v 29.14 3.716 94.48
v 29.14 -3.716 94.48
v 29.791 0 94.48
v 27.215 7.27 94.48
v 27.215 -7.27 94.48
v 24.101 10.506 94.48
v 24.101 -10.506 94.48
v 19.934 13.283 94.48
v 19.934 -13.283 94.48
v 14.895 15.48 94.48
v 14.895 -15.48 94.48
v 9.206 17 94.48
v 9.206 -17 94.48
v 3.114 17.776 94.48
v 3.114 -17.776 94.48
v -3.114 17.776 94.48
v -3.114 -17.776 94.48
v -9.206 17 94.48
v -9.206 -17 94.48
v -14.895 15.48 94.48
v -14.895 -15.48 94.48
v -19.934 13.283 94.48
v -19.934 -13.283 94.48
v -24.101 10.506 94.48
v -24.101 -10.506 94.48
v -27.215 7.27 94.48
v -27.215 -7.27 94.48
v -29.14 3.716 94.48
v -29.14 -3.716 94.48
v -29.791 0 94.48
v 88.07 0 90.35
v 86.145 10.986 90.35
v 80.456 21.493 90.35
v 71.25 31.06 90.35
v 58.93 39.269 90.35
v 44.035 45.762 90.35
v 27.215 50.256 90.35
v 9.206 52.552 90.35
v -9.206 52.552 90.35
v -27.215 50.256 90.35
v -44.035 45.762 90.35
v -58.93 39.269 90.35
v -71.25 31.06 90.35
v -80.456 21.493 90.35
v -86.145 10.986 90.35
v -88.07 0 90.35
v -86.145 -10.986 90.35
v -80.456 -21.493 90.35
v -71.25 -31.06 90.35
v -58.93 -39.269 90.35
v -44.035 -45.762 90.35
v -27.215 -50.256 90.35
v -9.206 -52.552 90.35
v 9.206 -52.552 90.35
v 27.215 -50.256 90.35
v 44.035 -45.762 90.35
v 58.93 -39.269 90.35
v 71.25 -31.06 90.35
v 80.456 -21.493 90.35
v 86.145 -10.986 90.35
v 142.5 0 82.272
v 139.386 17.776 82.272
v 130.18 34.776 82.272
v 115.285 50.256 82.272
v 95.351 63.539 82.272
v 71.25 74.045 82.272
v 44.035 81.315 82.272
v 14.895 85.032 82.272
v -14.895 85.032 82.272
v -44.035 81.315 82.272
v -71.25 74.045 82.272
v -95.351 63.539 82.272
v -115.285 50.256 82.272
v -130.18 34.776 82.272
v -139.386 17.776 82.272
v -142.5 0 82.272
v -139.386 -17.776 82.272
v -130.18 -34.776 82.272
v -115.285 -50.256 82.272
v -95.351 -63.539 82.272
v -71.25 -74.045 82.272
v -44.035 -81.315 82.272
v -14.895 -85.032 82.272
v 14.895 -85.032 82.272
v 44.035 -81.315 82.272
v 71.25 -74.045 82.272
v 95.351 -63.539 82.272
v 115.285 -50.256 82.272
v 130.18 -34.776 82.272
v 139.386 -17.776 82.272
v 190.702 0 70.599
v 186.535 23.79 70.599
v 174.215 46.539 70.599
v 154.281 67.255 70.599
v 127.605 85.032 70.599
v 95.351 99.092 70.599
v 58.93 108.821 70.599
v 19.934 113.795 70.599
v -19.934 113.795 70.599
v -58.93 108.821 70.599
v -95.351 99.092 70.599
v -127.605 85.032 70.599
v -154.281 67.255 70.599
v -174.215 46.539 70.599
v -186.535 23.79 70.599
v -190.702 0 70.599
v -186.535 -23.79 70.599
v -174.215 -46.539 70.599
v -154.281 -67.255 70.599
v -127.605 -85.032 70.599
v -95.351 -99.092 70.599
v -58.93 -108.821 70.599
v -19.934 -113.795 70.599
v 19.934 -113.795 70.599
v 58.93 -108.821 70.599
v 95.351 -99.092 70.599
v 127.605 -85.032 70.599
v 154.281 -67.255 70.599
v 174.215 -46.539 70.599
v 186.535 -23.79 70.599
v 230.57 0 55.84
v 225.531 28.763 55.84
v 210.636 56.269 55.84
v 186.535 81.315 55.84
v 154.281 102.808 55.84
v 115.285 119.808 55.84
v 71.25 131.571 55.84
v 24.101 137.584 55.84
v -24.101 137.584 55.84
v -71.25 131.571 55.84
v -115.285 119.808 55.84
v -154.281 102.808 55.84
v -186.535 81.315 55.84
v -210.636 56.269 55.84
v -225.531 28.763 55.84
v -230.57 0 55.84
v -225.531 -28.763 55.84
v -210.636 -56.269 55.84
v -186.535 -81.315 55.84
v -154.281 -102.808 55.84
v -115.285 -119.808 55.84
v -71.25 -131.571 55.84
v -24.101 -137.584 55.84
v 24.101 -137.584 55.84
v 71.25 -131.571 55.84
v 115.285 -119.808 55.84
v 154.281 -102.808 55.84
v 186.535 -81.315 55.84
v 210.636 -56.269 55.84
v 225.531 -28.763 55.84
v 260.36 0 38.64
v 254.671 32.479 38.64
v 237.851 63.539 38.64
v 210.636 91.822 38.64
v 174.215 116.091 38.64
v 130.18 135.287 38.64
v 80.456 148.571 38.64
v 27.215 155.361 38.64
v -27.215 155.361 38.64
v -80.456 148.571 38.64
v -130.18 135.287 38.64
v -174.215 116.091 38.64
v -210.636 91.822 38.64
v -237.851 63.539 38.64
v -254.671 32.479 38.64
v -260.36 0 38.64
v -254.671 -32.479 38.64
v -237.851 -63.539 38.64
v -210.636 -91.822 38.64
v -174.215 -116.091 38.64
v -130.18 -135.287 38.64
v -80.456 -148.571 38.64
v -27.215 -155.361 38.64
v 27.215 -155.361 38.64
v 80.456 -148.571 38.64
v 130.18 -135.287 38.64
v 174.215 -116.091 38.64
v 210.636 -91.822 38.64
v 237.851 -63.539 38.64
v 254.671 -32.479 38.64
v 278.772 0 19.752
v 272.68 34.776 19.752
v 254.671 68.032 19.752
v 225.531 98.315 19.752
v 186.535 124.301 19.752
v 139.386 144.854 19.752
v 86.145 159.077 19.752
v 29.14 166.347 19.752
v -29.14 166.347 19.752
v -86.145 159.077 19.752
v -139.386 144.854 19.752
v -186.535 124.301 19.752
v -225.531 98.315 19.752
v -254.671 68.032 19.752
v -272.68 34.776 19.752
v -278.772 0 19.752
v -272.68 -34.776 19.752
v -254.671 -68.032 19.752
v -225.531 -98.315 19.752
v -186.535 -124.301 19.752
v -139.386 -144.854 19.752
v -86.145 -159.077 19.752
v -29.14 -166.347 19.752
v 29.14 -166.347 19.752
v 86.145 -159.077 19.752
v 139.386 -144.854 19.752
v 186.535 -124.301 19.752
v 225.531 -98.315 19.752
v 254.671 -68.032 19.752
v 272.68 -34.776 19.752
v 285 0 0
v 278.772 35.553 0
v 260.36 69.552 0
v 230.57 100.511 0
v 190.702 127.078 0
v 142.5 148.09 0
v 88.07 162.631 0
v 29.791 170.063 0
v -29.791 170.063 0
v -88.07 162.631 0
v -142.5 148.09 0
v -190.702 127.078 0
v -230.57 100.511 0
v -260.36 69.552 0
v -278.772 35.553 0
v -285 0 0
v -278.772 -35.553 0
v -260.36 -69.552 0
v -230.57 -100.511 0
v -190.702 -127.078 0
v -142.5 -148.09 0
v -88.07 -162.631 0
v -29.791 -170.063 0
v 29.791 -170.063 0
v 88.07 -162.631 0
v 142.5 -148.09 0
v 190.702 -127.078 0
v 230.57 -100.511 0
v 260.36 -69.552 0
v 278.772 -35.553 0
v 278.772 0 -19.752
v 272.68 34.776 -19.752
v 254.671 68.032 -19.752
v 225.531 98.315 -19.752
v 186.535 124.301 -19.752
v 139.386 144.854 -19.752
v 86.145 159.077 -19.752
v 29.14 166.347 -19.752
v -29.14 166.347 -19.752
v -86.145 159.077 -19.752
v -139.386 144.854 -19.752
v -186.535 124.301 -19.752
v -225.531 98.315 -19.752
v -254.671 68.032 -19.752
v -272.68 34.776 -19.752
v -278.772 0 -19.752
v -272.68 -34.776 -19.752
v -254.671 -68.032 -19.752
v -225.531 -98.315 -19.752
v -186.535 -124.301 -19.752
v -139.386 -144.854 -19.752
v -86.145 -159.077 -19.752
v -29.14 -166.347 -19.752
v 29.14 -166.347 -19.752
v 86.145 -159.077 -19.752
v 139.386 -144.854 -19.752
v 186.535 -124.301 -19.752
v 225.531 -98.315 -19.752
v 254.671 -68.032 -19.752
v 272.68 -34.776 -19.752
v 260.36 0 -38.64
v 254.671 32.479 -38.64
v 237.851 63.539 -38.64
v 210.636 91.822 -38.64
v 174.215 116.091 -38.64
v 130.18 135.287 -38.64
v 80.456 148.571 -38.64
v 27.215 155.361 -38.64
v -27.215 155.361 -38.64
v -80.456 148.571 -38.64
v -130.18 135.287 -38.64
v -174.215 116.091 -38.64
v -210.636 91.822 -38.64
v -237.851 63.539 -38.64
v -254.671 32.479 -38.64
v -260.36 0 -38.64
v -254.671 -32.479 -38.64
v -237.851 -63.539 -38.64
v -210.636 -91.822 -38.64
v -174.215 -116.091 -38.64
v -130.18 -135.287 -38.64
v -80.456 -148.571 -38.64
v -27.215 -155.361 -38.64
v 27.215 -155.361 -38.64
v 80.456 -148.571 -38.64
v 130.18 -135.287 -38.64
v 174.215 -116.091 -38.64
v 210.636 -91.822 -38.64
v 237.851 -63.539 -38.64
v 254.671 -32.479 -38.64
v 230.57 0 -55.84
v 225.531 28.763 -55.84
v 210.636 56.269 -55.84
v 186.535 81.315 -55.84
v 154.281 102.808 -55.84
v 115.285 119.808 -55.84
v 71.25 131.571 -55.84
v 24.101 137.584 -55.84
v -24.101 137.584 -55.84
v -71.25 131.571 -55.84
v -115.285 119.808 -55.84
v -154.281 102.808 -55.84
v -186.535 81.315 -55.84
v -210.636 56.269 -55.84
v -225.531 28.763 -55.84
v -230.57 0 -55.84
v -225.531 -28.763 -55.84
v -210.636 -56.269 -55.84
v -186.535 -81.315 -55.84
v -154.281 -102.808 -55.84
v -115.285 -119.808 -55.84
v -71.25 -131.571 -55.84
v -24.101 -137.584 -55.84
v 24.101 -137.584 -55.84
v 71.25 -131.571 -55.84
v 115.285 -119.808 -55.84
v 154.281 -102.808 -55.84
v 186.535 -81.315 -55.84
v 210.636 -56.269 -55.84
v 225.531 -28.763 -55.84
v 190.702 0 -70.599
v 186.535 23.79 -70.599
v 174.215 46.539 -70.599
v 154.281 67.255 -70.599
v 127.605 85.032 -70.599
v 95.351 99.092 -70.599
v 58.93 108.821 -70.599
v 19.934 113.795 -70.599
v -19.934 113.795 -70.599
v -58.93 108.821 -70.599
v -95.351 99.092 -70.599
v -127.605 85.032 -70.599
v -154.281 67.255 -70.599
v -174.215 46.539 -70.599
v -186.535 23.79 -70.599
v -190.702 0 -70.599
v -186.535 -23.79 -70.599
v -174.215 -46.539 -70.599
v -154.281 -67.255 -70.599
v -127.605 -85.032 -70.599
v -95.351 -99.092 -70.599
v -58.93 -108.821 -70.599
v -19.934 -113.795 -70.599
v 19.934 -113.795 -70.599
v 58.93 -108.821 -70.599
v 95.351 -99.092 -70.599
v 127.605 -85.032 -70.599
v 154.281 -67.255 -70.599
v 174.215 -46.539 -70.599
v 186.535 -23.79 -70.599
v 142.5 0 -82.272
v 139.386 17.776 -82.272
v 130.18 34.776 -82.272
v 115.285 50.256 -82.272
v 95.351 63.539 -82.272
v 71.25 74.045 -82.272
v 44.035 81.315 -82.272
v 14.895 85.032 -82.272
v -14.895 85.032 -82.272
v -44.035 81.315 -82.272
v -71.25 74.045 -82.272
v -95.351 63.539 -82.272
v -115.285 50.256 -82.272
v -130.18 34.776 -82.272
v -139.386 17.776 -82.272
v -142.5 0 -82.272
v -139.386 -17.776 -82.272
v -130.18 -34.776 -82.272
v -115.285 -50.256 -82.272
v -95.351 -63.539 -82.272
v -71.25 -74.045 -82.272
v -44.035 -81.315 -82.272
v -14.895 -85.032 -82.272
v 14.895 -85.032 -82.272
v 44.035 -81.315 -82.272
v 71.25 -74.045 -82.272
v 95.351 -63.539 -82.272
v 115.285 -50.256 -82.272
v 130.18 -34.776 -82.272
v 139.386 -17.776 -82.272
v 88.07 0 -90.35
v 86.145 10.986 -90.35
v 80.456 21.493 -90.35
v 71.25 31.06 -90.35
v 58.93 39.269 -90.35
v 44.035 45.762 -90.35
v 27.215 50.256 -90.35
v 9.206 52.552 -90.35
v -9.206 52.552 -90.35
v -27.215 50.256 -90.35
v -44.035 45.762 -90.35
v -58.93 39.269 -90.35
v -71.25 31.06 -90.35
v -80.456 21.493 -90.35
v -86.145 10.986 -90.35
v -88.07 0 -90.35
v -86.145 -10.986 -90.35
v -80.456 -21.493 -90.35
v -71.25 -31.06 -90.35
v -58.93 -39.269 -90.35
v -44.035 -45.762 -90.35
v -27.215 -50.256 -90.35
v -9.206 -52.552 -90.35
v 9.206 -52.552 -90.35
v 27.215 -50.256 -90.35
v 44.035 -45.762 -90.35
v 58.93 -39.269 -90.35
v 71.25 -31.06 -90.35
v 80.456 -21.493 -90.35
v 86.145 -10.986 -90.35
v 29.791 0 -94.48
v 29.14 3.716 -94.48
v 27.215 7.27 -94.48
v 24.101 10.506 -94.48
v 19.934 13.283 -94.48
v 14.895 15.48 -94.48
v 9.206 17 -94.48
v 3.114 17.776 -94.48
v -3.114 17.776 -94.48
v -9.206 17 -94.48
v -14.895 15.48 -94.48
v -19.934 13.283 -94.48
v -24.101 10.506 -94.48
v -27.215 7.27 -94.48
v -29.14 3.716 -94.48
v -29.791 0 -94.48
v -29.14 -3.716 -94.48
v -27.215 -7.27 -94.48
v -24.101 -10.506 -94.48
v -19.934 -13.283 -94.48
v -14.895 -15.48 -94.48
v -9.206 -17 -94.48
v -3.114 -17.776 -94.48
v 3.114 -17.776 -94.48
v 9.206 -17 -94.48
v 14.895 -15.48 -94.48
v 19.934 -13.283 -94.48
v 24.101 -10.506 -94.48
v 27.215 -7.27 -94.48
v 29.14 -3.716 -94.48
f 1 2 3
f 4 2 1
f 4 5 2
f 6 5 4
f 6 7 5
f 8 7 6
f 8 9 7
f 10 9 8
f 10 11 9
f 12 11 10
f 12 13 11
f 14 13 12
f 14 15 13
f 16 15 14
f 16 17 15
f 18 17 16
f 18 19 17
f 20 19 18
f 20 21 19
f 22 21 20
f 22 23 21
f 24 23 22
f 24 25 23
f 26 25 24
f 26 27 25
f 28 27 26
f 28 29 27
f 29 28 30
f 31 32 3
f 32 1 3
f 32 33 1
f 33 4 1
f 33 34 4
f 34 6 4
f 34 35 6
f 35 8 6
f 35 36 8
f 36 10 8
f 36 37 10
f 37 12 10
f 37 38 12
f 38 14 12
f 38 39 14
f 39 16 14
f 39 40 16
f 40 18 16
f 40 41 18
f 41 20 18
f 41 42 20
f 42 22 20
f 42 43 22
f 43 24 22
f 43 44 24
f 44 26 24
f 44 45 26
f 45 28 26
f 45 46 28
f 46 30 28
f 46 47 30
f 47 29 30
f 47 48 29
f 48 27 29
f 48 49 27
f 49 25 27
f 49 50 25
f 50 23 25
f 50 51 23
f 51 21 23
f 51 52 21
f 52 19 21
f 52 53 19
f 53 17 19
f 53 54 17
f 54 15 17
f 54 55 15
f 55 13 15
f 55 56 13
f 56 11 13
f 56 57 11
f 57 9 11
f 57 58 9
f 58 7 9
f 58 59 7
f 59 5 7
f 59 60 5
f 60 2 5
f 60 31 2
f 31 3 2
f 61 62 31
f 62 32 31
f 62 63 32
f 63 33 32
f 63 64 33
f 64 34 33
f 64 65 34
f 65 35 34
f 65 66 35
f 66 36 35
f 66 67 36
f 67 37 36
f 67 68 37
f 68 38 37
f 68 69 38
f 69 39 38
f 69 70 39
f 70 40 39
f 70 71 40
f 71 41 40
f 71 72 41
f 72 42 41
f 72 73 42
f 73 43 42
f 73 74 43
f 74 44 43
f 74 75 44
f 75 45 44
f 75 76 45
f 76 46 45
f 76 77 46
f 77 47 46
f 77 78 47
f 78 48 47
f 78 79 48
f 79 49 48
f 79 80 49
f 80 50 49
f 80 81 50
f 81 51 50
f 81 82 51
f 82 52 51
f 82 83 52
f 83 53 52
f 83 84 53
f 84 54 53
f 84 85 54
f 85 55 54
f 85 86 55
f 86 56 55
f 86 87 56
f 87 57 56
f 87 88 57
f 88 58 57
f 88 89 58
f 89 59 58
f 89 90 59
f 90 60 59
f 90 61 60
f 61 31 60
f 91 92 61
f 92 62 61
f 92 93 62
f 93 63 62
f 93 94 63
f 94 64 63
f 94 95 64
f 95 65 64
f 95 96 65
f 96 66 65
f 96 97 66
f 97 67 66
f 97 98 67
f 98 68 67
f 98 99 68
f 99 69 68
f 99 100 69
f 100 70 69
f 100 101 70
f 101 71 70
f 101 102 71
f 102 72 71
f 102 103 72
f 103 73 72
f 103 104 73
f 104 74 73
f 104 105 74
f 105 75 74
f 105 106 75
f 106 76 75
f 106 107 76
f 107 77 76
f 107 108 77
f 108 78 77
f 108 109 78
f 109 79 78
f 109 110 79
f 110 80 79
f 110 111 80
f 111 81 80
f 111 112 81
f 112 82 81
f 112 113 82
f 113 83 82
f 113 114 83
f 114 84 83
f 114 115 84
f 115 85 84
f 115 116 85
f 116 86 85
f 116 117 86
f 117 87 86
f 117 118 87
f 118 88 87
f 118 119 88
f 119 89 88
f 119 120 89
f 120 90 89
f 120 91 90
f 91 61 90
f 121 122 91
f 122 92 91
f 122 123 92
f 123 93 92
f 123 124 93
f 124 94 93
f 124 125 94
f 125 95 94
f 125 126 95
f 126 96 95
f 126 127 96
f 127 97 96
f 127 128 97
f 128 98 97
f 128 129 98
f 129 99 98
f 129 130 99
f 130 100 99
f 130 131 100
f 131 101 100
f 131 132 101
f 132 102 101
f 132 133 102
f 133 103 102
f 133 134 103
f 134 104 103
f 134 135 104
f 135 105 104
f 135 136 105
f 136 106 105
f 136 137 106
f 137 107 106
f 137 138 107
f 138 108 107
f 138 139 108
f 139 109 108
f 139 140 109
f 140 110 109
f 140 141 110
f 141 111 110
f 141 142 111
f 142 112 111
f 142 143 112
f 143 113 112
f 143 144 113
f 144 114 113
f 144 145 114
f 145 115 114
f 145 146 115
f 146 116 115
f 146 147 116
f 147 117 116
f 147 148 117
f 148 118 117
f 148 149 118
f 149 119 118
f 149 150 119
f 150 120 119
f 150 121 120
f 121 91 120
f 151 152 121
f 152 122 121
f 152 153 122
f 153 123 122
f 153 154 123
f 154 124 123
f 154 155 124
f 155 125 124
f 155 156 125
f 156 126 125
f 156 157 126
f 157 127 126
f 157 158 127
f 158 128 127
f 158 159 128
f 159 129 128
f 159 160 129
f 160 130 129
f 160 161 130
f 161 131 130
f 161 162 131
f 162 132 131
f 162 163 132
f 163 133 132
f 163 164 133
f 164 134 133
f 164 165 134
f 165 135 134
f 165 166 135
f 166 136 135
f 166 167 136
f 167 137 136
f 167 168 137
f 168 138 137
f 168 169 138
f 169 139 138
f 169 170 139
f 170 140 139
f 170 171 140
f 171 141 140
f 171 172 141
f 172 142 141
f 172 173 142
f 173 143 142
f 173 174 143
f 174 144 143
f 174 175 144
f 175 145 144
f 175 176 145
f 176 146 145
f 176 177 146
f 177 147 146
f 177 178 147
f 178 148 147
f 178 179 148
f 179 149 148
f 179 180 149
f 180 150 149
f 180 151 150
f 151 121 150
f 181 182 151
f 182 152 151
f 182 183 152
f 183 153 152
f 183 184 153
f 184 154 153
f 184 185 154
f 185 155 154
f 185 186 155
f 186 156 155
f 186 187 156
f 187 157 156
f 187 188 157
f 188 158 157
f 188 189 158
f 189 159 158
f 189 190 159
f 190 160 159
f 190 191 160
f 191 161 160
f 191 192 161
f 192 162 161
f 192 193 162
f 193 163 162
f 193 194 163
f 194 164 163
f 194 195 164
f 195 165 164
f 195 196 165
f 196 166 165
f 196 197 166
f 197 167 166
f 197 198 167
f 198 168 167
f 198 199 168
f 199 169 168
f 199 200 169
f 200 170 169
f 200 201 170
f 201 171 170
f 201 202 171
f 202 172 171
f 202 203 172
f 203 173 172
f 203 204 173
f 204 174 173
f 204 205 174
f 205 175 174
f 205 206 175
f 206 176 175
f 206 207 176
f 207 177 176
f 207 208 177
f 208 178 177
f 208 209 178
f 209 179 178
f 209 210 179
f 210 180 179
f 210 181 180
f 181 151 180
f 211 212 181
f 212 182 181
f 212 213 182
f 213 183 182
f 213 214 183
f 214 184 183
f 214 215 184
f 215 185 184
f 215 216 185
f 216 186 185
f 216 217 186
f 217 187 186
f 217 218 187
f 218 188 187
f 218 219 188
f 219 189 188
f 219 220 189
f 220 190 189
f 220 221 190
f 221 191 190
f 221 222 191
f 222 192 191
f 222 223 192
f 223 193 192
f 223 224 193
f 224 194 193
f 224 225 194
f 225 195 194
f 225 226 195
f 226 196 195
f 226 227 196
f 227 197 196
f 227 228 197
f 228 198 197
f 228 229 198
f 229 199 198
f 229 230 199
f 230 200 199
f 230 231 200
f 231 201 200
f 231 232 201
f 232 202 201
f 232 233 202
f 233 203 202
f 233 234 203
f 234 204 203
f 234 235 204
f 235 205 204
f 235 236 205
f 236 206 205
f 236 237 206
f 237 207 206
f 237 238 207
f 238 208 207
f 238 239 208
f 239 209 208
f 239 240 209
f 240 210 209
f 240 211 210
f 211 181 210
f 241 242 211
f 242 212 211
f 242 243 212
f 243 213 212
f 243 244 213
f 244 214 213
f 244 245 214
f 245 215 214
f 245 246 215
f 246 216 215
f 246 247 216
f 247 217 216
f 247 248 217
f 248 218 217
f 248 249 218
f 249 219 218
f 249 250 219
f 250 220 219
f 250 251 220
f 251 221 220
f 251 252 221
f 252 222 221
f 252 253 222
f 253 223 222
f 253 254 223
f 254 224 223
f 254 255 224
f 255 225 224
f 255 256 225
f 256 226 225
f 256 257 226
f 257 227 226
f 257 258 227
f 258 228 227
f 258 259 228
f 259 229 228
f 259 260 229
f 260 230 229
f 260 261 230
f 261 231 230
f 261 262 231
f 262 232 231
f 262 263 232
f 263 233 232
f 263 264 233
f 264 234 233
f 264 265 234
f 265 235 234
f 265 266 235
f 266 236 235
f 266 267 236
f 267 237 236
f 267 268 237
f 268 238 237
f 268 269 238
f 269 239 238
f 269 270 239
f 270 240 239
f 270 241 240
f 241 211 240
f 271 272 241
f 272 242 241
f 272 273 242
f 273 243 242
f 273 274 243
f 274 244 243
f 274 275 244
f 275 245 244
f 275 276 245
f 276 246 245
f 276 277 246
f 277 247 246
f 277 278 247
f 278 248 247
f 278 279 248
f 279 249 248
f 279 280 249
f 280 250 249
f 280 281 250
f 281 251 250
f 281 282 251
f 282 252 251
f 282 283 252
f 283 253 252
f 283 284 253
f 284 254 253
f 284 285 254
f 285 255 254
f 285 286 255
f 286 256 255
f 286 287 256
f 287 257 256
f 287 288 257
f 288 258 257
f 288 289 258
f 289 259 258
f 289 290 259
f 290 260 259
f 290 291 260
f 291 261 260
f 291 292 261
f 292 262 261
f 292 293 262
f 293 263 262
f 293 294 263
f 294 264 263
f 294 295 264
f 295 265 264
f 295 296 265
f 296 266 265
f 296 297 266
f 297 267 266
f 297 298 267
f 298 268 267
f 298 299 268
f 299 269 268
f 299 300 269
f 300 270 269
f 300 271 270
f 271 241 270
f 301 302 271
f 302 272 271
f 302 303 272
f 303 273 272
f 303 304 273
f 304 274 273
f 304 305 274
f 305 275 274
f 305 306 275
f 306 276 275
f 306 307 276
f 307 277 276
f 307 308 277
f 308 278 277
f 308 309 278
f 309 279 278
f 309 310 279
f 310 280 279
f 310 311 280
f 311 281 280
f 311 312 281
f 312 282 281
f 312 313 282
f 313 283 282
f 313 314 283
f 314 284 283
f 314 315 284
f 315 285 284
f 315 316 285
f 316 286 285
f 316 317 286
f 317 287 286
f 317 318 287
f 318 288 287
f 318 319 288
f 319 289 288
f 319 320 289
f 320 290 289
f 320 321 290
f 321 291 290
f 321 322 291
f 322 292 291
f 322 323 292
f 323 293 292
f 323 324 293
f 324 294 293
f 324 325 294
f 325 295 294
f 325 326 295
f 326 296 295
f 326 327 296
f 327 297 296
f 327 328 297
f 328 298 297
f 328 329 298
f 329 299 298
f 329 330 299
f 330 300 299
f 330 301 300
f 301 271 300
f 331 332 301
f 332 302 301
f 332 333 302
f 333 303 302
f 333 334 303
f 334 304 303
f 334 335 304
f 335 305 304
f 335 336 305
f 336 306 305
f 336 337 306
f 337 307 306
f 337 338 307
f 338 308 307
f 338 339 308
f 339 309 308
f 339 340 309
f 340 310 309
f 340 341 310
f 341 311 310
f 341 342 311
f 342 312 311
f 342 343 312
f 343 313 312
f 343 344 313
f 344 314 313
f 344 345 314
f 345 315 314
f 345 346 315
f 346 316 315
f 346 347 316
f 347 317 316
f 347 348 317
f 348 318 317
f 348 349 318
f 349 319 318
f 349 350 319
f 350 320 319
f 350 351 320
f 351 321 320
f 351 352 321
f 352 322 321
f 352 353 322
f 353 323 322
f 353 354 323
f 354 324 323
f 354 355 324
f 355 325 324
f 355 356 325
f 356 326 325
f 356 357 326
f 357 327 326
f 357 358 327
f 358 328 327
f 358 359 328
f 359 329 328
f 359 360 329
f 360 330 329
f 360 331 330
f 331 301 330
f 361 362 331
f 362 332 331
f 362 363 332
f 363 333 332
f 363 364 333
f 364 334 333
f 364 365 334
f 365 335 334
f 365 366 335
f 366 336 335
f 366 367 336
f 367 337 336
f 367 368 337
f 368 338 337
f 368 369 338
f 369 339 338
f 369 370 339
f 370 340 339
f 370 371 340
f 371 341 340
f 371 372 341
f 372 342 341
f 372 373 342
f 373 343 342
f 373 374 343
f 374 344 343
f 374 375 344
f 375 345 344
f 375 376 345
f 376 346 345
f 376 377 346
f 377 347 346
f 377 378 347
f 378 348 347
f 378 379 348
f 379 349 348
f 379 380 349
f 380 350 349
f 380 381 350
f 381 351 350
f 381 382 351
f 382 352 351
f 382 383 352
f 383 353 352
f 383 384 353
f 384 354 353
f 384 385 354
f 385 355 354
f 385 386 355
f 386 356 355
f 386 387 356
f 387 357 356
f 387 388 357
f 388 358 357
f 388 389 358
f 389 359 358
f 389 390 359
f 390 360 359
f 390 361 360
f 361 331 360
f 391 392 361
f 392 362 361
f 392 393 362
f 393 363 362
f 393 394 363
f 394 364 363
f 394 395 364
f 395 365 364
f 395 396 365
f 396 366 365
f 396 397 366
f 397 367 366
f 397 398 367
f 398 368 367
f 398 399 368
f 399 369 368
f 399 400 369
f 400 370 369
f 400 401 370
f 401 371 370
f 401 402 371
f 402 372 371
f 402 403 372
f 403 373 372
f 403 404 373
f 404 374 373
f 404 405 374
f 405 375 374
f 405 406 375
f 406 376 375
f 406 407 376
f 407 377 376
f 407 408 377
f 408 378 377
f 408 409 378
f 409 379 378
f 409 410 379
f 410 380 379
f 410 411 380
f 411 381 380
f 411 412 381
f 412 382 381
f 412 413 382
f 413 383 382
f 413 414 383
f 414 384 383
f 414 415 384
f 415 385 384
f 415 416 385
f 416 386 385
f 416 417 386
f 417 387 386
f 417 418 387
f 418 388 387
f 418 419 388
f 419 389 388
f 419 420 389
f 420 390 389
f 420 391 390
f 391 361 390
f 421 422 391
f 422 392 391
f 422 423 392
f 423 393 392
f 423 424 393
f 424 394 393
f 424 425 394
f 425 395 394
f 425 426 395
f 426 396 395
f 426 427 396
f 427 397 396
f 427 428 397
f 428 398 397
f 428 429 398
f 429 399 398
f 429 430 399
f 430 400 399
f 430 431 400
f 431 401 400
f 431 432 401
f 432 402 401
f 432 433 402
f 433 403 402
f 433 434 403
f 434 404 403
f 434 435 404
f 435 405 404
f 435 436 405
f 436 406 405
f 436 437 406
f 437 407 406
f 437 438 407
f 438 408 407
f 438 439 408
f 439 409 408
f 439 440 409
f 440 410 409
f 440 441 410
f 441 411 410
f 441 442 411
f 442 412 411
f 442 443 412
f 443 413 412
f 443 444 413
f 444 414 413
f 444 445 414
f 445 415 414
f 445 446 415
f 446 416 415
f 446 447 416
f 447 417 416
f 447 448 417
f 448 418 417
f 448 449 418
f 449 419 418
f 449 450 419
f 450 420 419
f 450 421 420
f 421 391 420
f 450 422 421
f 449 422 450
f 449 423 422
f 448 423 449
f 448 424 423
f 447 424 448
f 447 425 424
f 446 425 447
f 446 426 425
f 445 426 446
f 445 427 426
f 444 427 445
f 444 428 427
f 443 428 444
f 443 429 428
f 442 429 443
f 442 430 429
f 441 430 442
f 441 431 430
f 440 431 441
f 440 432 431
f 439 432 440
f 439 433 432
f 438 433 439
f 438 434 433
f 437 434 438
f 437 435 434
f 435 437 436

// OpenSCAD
// Generated by SolidPython 1.0.1 on 2020-07-29 00:46:52


scale(v = [15, 9, 5]) {
	sphere(r = 19);
}
/***********************************************
*********      SolidPython code:      **********
************************************************
 
# import packages: SolidPython
from solid import *
from solid.utils import *
from itertools import chain, combinations, permutations


class Resize:

    def __init__(self, scad_file):
        self.scad_file = scad_file
        #self.scad_file = import_scad(scad_file)
        # cone/cylinder param:
        self.r1 = 0
        self.r2 = 0
        self.h = 0
        # rectangular prism param:
        self.w = 0
        self.l = 0
        # ellipse param:
        self.r = 0

    # import OpenScad code (file name corresponds to shape)


    # classify shape + parameters
    def assign(self, param1, param2, param3):
        if self.scad_file == 'cone.scad':
            self.r1 = param1
            self.r2 = param2
            self.h = param3
        elif self.scad_file == 'cylinder.scad':
            self.r1 = param1
            self.r2 = param2
            self.h = param3
        elif self.scad_file == 'rectangularPrism.scad':
            self.h = param1
            self.l = param2
            self.w = param3
        else:
            self.r = param1
            self.h = param2

    # resize parameters
    def iterate(self):
        x = range(3, 20, 2)
        i = 1
        if self.scad_file == 'cone.scad':
            tempList = list(permutations(x, 2))
            for temp in tempList:
                param1 = temp[0]
                param2 = temp[1]
                filepath = 'produced_scad_files/' + 'cone' + str(param1) + '_' + str(param2) + '_' + '.scad'
                scad_render_to_file(cylinder(h=param1, r1=param2, r2=0), filepath)

        elif self.scad_file == 'cylinder.scad':
            tempList = list(permutations(x, 3))
            for temp in tempList:
                param1 = temp[0]
                param2 = temp[1]
                filepath = 'produced_scad_files/' + 'cylinder' + str(param1) + '_' + str(param2) + '_' + '.scad'
                scad_render_to_file(cylinder(h=param1, r1=param2, r2=param2), filepath)

        elif self.scad_file == 'rectangularPrism.scad':
            tempList = list(permutations(x, 3))
            for temp in tempList:
                param1 = temp[0]
                param2 = temp[1]
                param3 = temp[2]
                filepath = 'produced_scad_files/' + 'rectangularPrism' + str(param1) + '_' + str(param2) + '_' + str(
                    param3) + '.scad'
                scad_render_to_file(cube(size=(param1, param2, param3)), filepath)

        elif self.scad_file == 'ellipse.scad':
            tempList = list(permutations(x, 4))
            for temp in tempList:
                param1 = temp[0]
                param2 = temp[1]
                param3 = temp[2]
                param4 = temp[3]
                filepath = 'produced_scad_files/' + 'ellipse' + str(param1) + '_' + str(param2) + '_' + str(param3) + '_' + str(param4) + '.scad'
                scad_render_to_file(scale([param1, param2, param3])(sphere(r=param4)), filepath)

    def render_to_scadfile(self):
        scad_render_to_file(scad, 'example.scad') 
 
************************************************/
